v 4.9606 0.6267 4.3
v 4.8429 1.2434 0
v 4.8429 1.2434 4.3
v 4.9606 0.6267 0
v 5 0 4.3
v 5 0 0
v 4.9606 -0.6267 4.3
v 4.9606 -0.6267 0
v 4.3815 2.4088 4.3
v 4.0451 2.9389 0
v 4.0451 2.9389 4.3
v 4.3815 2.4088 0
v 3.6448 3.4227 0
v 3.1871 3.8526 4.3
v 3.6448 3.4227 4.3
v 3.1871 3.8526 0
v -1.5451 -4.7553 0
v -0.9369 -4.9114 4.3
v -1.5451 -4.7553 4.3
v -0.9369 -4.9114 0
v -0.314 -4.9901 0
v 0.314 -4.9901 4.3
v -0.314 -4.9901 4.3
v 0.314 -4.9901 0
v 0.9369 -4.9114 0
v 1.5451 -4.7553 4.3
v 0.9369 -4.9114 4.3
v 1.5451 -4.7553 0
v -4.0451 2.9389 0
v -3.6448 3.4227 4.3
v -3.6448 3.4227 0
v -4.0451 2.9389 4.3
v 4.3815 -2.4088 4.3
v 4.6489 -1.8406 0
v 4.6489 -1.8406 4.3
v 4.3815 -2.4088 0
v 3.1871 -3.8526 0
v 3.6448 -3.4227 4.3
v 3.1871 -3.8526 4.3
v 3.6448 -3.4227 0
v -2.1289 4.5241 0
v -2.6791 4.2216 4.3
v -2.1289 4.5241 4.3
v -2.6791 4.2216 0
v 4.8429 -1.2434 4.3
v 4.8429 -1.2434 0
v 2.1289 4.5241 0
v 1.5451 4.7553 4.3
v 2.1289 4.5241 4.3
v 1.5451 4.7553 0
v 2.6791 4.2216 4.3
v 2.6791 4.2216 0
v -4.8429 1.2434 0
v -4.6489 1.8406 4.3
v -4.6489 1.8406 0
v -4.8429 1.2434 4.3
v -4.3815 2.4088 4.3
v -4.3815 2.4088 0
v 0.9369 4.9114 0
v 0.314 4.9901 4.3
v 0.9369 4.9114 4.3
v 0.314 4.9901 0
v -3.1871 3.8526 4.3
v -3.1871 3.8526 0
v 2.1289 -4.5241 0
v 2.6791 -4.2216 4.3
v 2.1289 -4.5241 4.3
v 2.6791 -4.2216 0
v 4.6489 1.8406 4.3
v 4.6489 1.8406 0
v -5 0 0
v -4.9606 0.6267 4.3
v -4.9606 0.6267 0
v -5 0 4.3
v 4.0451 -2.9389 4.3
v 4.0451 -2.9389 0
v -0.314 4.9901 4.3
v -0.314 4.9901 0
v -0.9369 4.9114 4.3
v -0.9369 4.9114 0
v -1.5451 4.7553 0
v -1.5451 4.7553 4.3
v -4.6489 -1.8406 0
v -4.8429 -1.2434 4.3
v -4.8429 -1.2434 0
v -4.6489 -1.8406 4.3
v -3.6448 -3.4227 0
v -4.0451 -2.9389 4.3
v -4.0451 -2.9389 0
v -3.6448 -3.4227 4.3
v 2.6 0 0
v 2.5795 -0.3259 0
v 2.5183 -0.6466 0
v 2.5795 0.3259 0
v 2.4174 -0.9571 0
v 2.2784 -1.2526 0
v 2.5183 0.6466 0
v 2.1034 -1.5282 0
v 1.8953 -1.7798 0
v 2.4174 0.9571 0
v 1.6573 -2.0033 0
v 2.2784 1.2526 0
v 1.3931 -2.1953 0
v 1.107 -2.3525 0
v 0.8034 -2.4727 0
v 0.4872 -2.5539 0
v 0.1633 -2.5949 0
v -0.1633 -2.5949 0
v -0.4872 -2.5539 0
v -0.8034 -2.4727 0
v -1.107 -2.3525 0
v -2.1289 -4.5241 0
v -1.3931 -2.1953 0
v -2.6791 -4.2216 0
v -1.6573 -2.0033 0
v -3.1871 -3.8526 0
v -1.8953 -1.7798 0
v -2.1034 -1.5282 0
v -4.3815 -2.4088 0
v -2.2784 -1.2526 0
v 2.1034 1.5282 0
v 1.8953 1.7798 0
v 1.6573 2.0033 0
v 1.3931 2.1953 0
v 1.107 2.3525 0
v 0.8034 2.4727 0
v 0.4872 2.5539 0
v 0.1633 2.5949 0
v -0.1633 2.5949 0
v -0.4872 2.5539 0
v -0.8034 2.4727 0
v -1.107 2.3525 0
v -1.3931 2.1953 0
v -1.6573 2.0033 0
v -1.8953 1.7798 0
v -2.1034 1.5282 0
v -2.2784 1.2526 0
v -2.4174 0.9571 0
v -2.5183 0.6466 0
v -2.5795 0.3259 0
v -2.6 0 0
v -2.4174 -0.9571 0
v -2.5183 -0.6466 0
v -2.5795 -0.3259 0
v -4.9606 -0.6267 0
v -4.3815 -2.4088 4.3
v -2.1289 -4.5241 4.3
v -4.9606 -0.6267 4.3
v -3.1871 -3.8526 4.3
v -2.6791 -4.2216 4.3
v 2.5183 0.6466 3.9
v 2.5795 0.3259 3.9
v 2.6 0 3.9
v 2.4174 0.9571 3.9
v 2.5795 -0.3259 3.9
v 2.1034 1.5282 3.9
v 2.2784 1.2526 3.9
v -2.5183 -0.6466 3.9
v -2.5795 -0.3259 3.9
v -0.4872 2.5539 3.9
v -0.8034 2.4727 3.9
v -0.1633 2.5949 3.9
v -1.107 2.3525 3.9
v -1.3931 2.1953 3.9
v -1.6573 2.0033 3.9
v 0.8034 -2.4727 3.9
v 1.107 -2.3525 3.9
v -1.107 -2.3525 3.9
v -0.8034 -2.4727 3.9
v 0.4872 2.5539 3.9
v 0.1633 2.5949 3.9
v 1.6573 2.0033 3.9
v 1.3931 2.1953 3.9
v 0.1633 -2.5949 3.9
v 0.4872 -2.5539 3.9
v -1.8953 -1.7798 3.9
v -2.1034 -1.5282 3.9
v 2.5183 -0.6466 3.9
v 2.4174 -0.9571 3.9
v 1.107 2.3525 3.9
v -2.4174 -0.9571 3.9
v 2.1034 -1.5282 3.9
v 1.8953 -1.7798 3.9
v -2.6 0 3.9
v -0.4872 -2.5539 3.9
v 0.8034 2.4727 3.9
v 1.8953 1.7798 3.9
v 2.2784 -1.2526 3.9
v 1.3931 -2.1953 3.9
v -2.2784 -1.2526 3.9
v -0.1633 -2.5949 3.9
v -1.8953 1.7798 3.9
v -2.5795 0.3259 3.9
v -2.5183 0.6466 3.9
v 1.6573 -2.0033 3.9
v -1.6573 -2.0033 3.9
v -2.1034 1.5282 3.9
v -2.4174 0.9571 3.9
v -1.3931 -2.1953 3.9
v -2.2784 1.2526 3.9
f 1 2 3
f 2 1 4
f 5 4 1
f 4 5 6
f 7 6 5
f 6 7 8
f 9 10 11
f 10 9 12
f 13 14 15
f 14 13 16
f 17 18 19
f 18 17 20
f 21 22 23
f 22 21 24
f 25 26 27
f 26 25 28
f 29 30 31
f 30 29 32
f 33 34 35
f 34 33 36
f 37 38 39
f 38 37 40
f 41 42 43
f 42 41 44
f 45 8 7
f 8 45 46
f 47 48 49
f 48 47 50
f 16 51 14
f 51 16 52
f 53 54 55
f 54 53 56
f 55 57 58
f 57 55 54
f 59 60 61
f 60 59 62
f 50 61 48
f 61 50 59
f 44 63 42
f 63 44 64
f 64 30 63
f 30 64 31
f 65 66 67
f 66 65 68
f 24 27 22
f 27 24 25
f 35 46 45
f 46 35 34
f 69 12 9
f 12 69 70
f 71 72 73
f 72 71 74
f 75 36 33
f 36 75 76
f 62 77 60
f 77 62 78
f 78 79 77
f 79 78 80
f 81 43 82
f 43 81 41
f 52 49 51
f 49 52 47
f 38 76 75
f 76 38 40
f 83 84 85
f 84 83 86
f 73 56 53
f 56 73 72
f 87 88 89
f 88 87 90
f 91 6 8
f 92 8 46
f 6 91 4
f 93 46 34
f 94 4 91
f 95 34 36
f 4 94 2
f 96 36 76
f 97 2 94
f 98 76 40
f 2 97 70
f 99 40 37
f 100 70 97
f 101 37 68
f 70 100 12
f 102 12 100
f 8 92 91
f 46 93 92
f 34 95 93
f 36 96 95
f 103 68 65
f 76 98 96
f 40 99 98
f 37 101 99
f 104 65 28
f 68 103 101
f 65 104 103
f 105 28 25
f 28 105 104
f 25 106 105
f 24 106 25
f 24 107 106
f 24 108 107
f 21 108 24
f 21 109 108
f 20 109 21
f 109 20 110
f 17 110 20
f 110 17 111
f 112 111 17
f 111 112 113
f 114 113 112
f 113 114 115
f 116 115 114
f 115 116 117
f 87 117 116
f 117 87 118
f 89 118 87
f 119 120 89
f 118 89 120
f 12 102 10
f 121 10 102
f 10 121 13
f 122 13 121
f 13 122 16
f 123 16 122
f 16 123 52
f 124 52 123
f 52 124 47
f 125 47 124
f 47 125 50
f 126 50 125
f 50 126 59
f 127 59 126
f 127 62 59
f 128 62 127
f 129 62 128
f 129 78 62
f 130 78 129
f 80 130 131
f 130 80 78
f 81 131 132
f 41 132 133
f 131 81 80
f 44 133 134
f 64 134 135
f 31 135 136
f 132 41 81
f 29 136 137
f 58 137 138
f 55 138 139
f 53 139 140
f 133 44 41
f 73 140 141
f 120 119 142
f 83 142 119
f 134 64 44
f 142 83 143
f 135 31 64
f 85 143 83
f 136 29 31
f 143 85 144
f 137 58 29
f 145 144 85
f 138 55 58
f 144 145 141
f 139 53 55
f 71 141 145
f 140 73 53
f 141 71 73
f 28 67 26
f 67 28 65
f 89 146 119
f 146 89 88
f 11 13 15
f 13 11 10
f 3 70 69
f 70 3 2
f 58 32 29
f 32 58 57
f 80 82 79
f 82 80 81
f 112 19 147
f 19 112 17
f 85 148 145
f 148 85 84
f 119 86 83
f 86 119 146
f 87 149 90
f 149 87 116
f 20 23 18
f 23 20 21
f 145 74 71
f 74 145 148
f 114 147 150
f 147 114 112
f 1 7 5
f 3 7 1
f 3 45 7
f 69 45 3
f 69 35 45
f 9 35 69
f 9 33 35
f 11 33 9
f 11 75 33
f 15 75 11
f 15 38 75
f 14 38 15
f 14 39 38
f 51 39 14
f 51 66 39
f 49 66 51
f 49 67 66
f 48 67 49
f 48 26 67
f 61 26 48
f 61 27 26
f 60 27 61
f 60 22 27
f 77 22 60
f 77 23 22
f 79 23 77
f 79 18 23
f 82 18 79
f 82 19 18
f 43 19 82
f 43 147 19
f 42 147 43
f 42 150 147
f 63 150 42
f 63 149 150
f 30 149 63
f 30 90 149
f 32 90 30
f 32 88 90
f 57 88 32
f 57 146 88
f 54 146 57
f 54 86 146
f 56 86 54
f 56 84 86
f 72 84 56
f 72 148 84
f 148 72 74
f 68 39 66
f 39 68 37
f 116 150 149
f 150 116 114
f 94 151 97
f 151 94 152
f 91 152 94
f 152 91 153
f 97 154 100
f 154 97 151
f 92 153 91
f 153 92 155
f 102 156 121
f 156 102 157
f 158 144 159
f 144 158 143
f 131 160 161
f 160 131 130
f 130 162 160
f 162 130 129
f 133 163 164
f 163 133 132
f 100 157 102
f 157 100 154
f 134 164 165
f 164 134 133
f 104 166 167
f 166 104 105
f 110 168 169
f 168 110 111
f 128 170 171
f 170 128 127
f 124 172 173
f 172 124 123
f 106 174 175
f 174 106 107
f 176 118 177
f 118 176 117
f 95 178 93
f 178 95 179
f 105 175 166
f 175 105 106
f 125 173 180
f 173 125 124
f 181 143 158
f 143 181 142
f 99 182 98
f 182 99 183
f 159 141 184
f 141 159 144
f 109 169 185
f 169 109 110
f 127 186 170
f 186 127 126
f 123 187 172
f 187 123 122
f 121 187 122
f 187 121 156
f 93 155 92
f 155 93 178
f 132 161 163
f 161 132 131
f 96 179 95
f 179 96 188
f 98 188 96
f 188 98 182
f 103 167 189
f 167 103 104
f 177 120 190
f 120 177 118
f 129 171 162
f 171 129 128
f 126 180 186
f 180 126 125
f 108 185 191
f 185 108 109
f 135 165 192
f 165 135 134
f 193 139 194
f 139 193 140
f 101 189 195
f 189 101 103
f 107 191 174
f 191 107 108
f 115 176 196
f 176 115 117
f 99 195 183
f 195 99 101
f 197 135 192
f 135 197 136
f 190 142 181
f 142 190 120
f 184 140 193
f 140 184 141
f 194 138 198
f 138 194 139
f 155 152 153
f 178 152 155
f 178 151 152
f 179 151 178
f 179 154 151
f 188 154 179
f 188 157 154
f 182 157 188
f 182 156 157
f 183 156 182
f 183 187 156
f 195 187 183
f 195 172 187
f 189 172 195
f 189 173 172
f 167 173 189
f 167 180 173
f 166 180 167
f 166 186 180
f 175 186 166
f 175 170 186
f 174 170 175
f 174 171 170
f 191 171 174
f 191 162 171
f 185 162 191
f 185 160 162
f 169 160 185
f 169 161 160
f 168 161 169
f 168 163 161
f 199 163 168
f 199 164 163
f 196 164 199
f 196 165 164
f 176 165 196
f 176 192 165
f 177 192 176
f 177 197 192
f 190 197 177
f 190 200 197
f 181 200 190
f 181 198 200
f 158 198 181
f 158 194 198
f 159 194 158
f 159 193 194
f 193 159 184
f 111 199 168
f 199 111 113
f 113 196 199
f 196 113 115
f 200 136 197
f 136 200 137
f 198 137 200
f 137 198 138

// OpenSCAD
case_diameter   = 10;
case_height     =  4.3;
//case_height     =  5;

/*
//big magnet
magnet_diameter =  8.3;
magnet_height   =  3.3;
text_size       =  5;
*/

//medium magnet
magnet_diameter =  5.2;
//magnet_height   =  3.2;
magnet_height   =  3.9;
text_size       =  5;

/*
//small magnet
magnet_diameter =  3.3;
magnet_height   =  2.3;
text_size       =  5;
*/

$fn = 50;

module magnet() {    
    cylinder( d = magnet_diameter, h = magnet_height );
}

module magnet_case() {
    difference() {
        cylinder( d = case_diameter, h = case_height );
        translate([0, 0, -1]) cylinder( d = magnet_diameter, h = magnet_height + 1 );
    }
}

module magnet_text(mtext) {
    linear_extrude((1/2)*text_size) text(mtext, size=text_size);
}

color([1, 0, 0]) magnet_case();
//color([1, 1, 0]) translate([(-1/2)*text_size, (-1/2)*text_size, case_height] ) magnet_text("S");
